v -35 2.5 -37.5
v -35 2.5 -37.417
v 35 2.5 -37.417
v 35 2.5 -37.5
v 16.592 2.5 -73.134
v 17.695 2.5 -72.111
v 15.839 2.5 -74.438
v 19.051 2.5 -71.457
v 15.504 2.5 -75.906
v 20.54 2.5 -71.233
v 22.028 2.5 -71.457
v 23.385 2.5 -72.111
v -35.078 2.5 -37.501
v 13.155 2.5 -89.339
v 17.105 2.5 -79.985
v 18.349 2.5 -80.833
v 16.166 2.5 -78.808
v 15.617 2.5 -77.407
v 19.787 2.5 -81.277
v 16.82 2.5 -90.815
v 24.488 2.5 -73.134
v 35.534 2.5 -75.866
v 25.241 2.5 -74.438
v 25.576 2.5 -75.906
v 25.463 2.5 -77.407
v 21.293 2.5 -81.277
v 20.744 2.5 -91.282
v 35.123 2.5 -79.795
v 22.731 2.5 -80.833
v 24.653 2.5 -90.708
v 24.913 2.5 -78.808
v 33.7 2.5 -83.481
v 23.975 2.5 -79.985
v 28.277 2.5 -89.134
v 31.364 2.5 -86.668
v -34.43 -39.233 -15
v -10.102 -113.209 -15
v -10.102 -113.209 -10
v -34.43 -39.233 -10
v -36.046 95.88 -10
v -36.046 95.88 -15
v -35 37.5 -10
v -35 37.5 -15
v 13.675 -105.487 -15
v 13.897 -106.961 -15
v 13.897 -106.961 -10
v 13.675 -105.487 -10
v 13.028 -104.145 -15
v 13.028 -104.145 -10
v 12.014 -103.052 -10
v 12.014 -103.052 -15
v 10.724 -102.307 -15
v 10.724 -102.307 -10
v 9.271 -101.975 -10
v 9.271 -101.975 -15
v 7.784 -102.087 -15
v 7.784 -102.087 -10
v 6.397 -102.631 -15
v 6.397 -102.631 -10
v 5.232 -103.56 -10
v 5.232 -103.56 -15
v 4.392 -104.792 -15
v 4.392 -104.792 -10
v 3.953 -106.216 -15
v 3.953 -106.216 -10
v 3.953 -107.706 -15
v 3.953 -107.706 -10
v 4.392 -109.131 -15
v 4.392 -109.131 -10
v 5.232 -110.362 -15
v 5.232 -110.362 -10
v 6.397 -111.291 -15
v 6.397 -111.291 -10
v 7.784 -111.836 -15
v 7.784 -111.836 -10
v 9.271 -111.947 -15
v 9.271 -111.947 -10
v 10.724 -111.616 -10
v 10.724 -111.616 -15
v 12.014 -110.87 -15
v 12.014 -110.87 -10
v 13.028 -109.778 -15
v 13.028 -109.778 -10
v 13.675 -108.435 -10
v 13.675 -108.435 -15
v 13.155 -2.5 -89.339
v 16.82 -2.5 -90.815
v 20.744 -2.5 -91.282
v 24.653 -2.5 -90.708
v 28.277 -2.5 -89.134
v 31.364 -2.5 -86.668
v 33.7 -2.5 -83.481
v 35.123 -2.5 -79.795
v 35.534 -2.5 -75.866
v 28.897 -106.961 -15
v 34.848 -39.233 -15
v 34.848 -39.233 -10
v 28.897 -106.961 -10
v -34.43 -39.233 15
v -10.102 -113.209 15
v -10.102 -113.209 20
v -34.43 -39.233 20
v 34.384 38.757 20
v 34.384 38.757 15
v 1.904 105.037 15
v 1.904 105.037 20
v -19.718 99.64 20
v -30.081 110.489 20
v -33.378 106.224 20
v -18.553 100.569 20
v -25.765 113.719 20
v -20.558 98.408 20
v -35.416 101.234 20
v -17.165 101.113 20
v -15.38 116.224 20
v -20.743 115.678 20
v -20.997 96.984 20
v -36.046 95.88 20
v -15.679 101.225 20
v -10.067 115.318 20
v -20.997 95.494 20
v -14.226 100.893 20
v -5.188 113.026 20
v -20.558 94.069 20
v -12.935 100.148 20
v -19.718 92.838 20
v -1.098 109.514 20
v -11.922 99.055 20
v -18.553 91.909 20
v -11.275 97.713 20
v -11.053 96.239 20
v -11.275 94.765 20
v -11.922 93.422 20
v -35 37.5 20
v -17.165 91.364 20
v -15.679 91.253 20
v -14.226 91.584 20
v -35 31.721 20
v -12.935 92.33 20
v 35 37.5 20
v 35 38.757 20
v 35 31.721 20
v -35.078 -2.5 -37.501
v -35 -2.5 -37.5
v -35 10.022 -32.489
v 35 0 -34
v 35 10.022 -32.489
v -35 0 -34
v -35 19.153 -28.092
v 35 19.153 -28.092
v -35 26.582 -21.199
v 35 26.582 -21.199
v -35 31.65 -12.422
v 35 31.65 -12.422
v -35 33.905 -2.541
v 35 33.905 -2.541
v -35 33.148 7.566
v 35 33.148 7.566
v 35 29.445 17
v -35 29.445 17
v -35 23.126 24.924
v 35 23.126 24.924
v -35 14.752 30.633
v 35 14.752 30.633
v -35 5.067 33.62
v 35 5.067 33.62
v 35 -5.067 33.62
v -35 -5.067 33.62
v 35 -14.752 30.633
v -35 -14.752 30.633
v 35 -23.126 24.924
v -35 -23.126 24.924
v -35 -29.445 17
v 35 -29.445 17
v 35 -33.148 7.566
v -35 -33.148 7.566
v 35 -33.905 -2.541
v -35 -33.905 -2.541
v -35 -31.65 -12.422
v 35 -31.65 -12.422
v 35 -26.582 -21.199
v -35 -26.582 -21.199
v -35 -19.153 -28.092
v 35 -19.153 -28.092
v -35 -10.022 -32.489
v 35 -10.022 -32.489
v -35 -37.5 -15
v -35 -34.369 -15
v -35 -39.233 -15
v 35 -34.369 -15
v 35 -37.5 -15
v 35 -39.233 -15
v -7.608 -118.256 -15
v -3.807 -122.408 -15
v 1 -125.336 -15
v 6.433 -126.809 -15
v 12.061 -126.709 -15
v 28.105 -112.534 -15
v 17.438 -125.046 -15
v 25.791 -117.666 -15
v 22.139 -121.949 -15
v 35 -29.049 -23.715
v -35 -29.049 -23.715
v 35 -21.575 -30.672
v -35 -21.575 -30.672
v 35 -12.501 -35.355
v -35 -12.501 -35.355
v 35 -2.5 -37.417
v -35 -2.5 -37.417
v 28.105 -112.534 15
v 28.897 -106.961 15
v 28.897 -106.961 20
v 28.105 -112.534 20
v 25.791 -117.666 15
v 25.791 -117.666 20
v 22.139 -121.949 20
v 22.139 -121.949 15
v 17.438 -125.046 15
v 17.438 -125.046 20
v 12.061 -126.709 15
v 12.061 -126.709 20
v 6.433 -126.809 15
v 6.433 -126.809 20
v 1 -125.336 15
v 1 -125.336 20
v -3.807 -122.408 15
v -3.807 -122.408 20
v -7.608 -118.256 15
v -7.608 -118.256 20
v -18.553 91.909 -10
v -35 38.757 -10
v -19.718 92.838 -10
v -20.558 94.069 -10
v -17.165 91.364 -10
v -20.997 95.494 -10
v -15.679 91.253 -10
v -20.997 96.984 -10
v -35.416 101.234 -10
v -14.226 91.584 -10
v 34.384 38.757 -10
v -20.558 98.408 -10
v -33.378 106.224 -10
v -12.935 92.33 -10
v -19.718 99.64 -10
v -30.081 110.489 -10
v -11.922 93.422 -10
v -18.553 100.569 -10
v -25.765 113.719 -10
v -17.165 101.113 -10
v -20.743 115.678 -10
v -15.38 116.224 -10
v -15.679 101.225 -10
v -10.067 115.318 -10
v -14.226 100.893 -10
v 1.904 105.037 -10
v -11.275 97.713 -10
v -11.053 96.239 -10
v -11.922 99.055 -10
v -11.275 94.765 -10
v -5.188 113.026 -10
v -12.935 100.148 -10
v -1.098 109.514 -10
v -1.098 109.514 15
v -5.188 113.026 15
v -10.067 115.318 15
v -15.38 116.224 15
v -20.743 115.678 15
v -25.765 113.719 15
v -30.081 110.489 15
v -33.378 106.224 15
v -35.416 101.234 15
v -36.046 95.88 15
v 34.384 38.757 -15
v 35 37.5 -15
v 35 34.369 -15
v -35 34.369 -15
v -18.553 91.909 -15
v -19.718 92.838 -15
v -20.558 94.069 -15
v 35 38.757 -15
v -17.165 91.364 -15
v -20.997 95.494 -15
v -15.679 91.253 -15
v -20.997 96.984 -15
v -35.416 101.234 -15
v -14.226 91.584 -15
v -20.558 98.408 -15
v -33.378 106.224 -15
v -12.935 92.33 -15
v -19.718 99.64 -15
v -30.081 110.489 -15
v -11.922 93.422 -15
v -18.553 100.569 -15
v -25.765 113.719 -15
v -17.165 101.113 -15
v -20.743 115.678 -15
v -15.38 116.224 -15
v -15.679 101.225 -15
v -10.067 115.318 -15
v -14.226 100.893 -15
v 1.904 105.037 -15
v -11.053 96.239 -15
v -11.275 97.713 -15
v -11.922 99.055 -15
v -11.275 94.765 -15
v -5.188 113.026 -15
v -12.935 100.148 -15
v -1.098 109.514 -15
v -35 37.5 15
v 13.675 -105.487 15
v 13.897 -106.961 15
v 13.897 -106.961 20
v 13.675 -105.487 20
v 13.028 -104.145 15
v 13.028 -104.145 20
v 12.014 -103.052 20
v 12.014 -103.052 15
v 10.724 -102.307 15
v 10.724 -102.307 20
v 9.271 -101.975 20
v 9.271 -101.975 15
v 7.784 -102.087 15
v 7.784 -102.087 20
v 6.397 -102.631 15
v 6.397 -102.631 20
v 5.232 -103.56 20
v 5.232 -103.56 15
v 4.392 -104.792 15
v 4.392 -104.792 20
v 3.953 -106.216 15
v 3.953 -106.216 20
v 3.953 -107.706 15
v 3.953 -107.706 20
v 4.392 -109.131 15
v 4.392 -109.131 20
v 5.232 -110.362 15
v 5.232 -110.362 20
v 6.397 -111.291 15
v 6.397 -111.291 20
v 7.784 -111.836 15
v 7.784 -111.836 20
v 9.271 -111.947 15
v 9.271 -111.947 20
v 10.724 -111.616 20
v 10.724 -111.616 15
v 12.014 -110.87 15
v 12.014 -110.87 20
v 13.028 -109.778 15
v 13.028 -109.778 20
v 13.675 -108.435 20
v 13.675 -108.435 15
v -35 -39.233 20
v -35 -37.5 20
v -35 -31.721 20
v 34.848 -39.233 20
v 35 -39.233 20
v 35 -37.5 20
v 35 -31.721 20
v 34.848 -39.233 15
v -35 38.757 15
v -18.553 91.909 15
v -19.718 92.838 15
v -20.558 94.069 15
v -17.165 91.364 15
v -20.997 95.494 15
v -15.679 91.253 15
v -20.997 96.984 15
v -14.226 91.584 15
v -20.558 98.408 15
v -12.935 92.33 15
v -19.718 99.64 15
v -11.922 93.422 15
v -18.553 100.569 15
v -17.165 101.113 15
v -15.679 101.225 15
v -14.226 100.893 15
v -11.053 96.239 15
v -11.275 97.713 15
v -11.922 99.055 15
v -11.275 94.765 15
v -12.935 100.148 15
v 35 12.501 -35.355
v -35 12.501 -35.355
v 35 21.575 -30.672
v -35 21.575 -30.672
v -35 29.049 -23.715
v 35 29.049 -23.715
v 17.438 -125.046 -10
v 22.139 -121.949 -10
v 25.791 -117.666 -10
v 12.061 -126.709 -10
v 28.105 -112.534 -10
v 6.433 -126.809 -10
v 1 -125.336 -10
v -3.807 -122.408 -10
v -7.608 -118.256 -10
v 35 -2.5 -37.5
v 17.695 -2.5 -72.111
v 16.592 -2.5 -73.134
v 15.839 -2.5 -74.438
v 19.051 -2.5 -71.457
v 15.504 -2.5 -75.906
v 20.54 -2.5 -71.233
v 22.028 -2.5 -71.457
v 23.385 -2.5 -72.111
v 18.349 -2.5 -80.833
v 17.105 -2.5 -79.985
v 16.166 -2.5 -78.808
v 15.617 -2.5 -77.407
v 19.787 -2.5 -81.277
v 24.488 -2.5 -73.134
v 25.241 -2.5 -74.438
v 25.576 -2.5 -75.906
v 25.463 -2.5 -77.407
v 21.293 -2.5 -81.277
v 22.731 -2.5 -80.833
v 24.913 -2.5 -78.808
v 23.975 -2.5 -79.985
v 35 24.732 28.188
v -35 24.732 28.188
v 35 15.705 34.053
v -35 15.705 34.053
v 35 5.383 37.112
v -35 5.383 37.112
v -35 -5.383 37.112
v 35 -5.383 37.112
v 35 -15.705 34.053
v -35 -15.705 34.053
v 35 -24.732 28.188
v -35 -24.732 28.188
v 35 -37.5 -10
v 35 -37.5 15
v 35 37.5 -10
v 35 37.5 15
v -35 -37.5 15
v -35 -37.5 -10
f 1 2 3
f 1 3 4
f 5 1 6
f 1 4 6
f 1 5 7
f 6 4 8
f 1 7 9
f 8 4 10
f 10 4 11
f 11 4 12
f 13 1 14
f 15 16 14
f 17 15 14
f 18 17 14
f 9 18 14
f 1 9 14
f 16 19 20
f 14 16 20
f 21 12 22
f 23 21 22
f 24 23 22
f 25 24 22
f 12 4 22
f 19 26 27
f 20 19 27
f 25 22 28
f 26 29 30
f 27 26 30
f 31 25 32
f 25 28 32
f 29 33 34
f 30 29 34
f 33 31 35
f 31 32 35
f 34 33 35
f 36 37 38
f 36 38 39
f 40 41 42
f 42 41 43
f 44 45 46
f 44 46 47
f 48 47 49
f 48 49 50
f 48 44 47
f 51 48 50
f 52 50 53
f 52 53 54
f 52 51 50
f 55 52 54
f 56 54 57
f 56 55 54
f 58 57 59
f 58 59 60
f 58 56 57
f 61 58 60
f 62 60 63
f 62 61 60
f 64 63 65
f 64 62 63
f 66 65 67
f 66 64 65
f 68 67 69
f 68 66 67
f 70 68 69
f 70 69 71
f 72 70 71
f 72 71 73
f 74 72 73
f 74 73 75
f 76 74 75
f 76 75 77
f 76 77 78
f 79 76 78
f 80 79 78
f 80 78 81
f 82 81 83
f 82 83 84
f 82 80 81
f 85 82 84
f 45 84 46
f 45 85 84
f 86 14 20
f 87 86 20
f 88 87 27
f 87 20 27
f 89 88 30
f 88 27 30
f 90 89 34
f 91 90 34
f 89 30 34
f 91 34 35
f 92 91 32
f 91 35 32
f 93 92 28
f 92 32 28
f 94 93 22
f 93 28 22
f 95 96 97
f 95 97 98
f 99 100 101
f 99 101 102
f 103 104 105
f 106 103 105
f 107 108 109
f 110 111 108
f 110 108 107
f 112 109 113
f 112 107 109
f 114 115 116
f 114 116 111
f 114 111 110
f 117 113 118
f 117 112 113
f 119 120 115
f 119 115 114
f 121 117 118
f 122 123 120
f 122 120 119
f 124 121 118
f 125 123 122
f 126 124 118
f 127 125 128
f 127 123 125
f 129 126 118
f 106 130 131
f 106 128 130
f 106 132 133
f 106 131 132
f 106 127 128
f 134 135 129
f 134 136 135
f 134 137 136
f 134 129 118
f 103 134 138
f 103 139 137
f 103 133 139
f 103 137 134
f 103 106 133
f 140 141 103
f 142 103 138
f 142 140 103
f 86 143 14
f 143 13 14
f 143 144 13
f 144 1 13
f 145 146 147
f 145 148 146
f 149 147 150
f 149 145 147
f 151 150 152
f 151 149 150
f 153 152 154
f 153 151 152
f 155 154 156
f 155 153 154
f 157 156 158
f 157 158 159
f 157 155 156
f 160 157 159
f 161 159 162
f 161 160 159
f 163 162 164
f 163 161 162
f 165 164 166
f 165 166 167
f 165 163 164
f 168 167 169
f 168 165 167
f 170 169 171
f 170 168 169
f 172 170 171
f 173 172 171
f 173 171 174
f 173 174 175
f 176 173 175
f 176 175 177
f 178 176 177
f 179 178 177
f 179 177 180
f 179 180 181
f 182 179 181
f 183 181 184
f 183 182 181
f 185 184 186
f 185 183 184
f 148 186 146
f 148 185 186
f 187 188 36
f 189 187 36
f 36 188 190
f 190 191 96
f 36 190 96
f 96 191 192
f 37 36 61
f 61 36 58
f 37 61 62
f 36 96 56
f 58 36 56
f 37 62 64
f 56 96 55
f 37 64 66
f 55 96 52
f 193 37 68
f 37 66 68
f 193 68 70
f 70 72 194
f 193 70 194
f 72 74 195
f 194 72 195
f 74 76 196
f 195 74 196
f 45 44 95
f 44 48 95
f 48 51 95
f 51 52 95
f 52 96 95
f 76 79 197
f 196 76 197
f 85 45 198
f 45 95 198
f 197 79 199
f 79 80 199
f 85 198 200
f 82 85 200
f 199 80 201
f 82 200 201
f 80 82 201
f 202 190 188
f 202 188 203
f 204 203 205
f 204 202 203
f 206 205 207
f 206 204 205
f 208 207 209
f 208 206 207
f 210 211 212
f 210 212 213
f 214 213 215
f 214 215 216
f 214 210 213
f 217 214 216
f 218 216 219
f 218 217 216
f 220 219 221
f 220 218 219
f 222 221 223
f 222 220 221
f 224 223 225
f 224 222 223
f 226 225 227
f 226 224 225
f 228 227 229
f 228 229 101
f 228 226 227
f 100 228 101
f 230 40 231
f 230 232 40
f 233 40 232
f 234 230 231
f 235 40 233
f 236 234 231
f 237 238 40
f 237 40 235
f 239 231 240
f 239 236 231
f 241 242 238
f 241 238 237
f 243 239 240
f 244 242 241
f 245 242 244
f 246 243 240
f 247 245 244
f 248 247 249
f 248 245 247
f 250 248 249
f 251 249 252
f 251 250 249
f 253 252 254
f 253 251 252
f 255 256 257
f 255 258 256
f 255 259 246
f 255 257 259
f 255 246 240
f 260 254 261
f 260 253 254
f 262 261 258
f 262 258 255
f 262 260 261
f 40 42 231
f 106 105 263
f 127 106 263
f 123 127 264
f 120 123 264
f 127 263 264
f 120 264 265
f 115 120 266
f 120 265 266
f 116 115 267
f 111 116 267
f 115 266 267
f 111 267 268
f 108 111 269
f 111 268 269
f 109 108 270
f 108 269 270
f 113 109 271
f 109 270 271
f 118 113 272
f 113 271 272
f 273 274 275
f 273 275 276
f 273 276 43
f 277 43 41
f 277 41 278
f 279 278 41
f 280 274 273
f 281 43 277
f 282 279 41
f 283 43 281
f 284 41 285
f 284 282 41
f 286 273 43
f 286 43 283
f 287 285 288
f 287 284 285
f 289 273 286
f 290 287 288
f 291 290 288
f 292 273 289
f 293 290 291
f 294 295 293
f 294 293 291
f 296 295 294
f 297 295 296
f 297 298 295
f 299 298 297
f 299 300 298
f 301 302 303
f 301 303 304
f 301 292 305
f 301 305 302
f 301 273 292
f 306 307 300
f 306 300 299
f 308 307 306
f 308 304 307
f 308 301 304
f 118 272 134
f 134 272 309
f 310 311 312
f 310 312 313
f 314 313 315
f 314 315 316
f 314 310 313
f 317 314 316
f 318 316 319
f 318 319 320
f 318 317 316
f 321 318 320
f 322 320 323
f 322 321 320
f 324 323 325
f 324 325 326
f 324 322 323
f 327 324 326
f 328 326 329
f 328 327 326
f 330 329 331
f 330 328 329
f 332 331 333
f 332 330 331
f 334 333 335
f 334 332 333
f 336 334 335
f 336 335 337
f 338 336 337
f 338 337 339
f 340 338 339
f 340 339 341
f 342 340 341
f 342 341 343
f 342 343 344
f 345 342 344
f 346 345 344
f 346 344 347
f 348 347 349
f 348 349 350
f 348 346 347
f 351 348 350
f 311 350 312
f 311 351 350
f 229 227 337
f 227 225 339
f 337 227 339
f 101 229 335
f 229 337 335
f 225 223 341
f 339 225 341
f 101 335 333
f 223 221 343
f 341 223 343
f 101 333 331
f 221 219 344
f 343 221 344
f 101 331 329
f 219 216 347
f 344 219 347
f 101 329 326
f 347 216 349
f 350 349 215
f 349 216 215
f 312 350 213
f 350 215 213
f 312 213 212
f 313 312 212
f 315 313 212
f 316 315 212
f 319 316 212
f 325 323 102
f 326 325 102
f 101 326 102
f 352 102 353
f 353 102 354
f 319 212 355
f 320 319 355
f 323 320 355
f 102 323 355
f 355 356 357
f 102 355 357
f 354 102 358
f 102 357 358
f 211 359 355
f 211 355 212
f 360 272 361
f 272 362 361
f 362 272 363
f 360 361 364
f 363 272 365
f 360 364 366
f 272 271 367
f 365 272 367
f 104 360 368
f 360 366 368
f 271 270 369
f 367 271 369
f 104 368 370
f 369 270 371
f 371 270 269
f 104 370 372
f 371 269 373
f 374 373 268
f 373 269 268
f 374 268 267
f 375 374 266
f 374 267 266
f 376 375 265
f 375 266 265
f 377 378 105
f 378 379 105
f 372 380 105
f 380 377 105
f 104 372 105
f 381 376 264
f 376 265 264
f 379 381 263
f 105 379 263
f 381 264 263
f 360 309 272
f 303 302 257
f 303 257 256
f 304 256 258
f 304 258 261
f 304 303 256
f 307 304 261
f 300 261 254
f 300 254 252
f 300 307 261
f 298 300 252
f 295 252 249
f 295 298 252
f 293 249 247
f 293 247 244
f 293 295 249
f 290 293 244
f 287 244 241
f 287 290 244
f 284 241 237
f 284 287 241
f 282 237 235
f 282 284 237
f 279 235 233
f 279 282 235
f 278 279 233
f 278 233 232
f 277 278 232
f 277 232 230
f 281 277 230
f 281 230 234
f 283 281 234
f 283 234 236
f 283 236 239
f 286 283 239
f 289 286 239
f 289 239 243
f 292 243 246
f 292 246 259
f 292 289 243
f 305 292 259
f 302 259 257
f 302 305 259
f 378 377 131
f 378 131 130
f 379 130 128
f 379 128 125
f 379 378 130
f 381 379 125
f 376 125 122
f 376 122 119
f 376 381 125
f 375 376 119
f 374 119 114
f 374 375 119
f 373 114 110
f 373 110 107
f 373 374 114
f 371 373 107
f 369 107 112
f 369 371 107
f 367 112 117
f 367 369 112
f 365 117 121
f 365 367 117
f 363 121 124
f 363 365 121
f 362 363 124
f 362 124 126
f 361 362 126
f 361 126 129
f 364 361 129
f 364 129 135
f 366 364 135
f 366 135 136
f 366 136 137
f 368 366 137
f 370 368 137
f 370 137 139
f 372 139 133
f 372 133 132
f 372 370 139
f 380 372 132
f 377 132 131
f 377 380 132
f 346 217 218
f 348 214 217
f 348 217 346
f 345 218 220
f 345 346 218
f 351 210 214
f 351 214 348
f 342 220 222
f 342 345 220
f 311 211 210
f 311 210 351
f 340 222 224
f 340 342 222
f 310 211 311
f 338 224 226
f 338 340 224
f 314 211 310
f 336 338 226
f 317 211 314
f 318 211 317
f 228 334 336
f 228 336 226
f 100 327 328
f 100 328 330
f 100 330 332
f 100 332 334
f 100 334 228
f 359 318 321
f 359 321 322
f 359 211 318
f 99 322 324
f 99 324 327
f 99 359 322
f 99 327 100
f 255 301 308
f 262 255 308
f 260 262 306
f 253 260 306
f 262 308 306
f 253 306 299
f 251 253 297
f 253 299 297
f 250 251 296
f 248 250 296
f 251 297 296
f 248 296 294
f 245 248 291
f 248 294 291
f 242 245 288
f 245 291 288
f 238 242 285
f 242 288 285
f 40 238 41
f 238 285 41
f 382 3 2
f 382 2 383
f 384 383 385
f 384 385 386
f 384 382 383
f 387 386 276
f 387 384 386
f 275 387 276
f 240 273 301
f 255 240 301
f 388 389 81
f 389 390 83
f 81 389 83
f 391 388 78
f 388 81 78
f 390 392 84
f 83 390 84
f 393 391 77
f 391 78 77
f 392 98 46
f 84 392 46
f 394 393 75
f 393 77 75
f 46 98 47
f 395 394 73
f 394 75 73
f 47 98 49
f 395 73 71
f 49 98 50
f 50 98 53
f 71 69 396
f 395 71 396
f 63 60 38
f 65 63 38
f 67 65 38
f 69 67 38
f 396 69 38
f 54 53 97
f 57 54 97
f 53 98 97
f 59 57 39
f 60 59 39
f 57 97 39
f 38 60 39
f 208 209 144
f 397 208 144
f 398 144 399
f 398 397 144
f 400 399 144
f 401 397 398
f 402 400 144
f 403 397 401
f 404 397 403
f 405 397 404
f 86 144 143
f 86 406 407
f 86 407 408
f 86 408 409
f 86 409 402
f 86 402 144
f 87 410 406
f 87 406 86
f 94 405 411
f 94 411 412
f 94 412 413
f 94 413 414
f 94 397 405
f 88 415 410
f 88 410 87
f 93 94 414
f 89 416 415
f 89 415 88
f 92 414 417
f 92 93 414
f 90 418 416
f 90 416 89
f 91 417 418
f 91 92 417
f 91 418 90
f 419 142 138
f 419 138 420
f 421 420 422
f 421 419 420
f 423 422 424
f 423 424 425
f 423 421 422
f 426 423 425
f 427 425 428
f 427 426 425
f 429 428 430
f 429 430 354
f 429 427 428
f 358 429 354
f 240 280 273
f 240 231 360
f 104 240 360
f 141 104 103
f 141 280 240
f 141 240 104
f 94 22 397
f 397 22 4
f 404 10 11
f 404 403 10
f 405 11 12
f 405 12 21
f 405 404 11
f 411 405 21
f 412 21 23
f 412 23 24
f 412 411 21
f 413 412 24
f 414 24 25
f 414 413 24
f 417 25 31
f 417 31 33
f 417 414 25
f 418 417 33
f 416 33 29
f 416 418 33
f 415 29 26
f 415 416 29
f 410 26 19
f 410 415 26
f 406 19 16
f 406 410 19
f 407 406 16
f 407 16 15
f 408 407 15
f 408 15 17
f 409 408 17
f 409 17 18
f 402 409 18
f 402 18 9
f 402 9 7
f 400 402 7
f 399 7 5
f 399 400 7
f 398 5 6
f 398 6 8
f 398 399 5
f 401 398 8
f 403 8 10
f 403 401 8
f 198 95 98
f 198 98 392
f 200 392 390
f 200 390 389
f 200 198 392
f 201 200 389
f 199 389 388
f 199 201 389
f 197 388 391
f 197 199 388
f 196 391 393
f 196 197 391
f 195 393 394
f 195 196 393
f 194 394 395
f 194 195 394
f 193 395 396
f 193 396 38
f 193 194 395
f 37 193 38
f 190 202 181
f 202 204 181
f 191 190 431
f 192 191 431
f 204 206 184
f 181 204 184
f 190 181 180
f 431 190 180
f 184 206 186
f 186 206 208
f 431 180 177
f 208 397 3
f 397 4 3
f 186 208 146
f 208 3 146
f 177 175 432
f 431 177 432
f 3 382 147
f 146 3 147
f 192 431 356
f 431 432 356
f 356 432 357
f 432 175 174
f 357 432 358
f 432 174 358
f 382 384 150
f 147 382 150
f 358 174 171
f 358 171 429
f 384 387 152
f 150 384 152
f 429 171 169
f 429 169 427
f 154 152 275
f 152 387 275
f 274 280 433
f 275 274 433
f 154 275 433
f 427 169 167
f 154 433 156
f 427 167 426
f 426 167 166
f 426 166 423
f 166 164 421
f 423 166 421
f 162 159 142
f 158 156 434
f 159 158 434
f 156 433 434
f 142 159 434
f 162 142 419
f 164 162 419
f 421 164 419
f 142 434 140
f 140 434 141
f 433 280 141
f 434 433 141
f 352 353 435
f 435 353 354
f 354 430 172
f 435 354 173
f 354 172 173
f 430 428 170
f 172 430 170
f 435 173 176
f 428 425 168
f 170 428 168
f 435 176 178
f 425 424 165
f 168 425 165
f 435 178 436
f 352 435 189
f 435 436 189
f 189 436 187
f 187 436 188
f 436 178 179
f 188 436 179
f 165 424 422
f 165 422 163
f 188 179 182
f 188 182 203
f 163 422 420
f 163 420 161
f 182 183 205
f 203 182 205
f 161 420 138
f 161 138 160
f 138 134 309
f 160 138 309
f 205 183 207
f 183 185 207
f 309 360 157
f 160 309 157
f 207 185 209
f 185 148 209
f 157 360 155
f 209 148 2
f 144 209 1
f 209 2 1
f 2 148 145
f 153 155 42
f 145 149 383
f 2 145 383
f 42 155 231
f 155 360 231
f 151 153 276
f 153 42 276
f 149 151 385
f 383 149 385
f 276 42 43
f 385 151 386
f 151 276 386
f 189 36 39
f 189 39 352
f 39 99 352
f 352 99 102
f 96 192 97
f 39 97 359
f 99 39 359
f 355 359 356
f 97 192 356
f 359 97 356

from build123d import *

# Parameters (mm, degrees)
SKETCH1_R             = 37.5
SKETCH1_R_2           = 34
BOSS_EXTRUDE1_DEPTH   = 35
BOSS_EXTRUDE2_START   = 15
SKETCH2_R             = 5
BOSS_EXTRUDE2_DEPTH   = 5
BOSS_EXTRUDE2_2_DEPTH = 5
BOSS_EXTRUDE3_START   = -15
SKETCH2_2_R           = 5
BOSS_EXTRUDE3_DEPTH   = 5
BOSS_EXTRUDE3_2_DEPTH = 5
BOSS_EXTRUDE4_DEPTH   = 70
BOSS_EXTRUDE5_START   = -70
BOSS_EXTRUDE5_DEPTH   = 70
SKETCH5_R             = 5.05
BOSS_EXTRUDE6_DEPTH   = 2.5
SKETCH6_W             = 0.149877485
SKETCH6_H             = 5
BOSS_EXTRUDE7_DEPTH   = 70


with BuildPart() as part:
    # Sketch1 → Boss-Extrude1 (new, symmetric)
    with BuildSketch(Plane(origin=(0, 0, 0), x_dir=(0, 0, -1), z_dir=(1, 0, 0))):
        Circle(SKETCH1_R)
        Circle(SKETCH1_R_2, mode=Mode.SUBTRACT)
    extrude(amount=BOSS_EXTRUDE1_DEPTH, both=True)



with BuildPart() as body_2:
    # Sketch2 → Boss-Extrude2 (new body)
    with BuildSketch(Plane.XY.offset(BOSS_EXTRUDE2_START)):
        with BuildLine():
            Line((-36.046360502, 95.880386994), (-35, 37.5))
            Line((-35, 37.5), (35, 37.5))
            Line((35, 37.5), (1.90425986, 105.037379634))
            ThreePointArc((1.90425986, 105.037379634), (-20.743145305, 115.677666176), (-36.046360502, 95.880386994))
        make_face()
        with Locations((-16.052783226, 96.238734902)):
            Circle(SKETCH2_R, mode=Mode.SUBTRACT)
    extrude(amount=BOSS_EXTRUDE2_DEPTH)


with BuildPart() as body_3:
    # Sketch2 → Boss-Extrude2 2 (new body)
    with BuildSketch(Plane.XY.offset(BOSS_EXTRUDE2_START)):
        with BuildLine():
            Line((-35, -37.5), (35, -37.5))
            Line((35, -37.5), (28.89703955, -106.961265098))
            ThreePointArc((28.89703955, -106.961265098), (12.060917272, -126.709426475), (-10.101948226, -113.209341881))
            Line((-10.101948226, -113.209341881), (-35, -37.5))
        make_face()
        with Locations((8.89703955, -106.961265098)):
            Circle(SKETCH2_R, mode=Mode.SUBTRACT)
    extrude(amount=BOSS_EXTRUDE2_2_DEPTH)


with BuildPart() as body_4:
    # Sketch2<2> → Boss-Extrude3 (new body)
    with BuildSketch(Plane.XY.offset(BOSS_EXTRUDE3_START)):
        with BuildLine():
            Line((-36.046360502, 95.880386994), (-35, 37.5))
            Line((-35, 37.5), (35, 37.5))
            Line((35, 37.5), (1.90425986, 105.037379634))
            ThreePointArc((1.90425986, 105.037379634), (-20.743145305, 115.677666176), (-36.046360502, 95.880386994))
        make_face()
        with Locations((-16.052783226, 96.238734902)):
            Circle(SKETCH2_2_R, mode=Mode.SUBTRACT)
    extrude(amount=BOSS_EXTRUDE3_DEPTH)


with BuildPart() as body_5:
    # Sketch2<2> → Boss-Extrude3 2 (new body)
    with BuildSketch(Plane.XY.offset(BOSS_EXTRUDE3_START)):
        with BuildLine():
            Line((-35, -37.5), (35, -37.5))
            Line((35, -37.5), (28.89703955, -106.961265098))
            ThreePointArc((28.89703955, -106.961265098), (12.060917272, -126.709426475), (-10.101948226, -113.209341881))
            Line((-10.101948226, -113.209341881), (-35, -37.5))
        make_face()
        with Locations((8.89703955, -106.961265098)):
            Circle(SKETCH2_2_R, mode=Mode.SUBTRACT)
    extrude(amount=BOSS_EXTRUDE3_2_DEPTH)


with BuildPart() as part_1:
    add(part.part)

    add(body_2.part)  # Boss-Extrude4 merges body 2

    add(body_4.part)  # Boss-Extrude4 merges body 4
    # Sketch3 → Boss-Extrude4 (add)
    with BuildSketch(Plane(origin=(35, 0, 0), x_dir=(0, 0, -1), z_dir=(1, 0, 0))):
        with BuildLine():
            Line((-20, 37.5), (-20, 31.721443851))
            ThreePointArc((-20, 31.721443851), (-2.828923646, 37.393143636), (15, 34.369317712))
            Line((15, 34.369317712), (15, 37.5))
            Line((15, 37.5), (15, 38.756727822))
            Line((15, 38.756727822), (-20, 38.756727822))
            Line((-20, 38.756727822), (-20, 37.5))
        make_face()
    extrude(amount=-BOSS_EXTRUDE4_DEPTH)


    add(body_3.part)  # Boss-Extrude5 merges body 3

    add(body_5.part)  # Boss-Extrude5 merges body 5
    # Sketch4 → Boss-Extrude5 (add)
    with BuildSketch(Plane.ZY.offset(35).offset(BOSS_EXTRUDE5_START)):
        with BuildLine():
            Line((-15, -39.232593617), (20, -39.232593617))
            Line((20, -39.232593617), (20, -31.721443851))
            ThreePointArc((20, -31.721443851), (2.828923646, -37.393143636), (-15, -34.369317712))
            Line((-15, -34.369317712), (-15, -39.232593617))
        make_face()
    extrude(amount=BOSS_EXTRUDE5_DEPTH)



with BuildPart() as body_2_2:
    # Sketch5 → Boss-Extrude6 (new, symmetric)
    with BuildSketch(Plane(origin=(0, 0, 0), x_dir=(1, 0, 0), z_dir=(0, 1, 0))):
        with BuildLine():
            Line((35, 37.5), (-35, 37.5))
            Line((-35, 37.5), (-35.078450863, 37.500626944))
            Line((-35.078450863, 37.500626944), (13.155155891, 89.33933901))
            ThreePointArc((13.155155891, 89.33933901), (28.276948524, 89.13371958), (35.534104179, 75.865540218))
            Line((35.534104179, 75.865540218), (35, 37.5))
        make_face()
        with Locations(Location((20.539917261, 76.283102971, 0), (0, 0, 270))):
            Circle(SKETCH5_R, mode=Mode.SUBTRACT)
    extrude(amount=BOSS_EXTRUDE6_DEPTH, both=True)


with BuildPart() as part_2:
    add(part_1.part)

    add(body_2_2.part)  # Boss-Extrude7 merges body 2 2
    # Sketch6 → Boss-Extrude7 (add)
    with BuildSketch(Plane(origin=(35, 0, 0), x_dir=(0, 0, -1), z_dir=(1, 0, 0))):
        with Locations((37.425061258, 0)):
            Rectangle(SKETCH6_W, SKETCH6_H)
    extrude(amount=-BOSS_EXTRUDE7_DEPTH)


solid = part_2.part
